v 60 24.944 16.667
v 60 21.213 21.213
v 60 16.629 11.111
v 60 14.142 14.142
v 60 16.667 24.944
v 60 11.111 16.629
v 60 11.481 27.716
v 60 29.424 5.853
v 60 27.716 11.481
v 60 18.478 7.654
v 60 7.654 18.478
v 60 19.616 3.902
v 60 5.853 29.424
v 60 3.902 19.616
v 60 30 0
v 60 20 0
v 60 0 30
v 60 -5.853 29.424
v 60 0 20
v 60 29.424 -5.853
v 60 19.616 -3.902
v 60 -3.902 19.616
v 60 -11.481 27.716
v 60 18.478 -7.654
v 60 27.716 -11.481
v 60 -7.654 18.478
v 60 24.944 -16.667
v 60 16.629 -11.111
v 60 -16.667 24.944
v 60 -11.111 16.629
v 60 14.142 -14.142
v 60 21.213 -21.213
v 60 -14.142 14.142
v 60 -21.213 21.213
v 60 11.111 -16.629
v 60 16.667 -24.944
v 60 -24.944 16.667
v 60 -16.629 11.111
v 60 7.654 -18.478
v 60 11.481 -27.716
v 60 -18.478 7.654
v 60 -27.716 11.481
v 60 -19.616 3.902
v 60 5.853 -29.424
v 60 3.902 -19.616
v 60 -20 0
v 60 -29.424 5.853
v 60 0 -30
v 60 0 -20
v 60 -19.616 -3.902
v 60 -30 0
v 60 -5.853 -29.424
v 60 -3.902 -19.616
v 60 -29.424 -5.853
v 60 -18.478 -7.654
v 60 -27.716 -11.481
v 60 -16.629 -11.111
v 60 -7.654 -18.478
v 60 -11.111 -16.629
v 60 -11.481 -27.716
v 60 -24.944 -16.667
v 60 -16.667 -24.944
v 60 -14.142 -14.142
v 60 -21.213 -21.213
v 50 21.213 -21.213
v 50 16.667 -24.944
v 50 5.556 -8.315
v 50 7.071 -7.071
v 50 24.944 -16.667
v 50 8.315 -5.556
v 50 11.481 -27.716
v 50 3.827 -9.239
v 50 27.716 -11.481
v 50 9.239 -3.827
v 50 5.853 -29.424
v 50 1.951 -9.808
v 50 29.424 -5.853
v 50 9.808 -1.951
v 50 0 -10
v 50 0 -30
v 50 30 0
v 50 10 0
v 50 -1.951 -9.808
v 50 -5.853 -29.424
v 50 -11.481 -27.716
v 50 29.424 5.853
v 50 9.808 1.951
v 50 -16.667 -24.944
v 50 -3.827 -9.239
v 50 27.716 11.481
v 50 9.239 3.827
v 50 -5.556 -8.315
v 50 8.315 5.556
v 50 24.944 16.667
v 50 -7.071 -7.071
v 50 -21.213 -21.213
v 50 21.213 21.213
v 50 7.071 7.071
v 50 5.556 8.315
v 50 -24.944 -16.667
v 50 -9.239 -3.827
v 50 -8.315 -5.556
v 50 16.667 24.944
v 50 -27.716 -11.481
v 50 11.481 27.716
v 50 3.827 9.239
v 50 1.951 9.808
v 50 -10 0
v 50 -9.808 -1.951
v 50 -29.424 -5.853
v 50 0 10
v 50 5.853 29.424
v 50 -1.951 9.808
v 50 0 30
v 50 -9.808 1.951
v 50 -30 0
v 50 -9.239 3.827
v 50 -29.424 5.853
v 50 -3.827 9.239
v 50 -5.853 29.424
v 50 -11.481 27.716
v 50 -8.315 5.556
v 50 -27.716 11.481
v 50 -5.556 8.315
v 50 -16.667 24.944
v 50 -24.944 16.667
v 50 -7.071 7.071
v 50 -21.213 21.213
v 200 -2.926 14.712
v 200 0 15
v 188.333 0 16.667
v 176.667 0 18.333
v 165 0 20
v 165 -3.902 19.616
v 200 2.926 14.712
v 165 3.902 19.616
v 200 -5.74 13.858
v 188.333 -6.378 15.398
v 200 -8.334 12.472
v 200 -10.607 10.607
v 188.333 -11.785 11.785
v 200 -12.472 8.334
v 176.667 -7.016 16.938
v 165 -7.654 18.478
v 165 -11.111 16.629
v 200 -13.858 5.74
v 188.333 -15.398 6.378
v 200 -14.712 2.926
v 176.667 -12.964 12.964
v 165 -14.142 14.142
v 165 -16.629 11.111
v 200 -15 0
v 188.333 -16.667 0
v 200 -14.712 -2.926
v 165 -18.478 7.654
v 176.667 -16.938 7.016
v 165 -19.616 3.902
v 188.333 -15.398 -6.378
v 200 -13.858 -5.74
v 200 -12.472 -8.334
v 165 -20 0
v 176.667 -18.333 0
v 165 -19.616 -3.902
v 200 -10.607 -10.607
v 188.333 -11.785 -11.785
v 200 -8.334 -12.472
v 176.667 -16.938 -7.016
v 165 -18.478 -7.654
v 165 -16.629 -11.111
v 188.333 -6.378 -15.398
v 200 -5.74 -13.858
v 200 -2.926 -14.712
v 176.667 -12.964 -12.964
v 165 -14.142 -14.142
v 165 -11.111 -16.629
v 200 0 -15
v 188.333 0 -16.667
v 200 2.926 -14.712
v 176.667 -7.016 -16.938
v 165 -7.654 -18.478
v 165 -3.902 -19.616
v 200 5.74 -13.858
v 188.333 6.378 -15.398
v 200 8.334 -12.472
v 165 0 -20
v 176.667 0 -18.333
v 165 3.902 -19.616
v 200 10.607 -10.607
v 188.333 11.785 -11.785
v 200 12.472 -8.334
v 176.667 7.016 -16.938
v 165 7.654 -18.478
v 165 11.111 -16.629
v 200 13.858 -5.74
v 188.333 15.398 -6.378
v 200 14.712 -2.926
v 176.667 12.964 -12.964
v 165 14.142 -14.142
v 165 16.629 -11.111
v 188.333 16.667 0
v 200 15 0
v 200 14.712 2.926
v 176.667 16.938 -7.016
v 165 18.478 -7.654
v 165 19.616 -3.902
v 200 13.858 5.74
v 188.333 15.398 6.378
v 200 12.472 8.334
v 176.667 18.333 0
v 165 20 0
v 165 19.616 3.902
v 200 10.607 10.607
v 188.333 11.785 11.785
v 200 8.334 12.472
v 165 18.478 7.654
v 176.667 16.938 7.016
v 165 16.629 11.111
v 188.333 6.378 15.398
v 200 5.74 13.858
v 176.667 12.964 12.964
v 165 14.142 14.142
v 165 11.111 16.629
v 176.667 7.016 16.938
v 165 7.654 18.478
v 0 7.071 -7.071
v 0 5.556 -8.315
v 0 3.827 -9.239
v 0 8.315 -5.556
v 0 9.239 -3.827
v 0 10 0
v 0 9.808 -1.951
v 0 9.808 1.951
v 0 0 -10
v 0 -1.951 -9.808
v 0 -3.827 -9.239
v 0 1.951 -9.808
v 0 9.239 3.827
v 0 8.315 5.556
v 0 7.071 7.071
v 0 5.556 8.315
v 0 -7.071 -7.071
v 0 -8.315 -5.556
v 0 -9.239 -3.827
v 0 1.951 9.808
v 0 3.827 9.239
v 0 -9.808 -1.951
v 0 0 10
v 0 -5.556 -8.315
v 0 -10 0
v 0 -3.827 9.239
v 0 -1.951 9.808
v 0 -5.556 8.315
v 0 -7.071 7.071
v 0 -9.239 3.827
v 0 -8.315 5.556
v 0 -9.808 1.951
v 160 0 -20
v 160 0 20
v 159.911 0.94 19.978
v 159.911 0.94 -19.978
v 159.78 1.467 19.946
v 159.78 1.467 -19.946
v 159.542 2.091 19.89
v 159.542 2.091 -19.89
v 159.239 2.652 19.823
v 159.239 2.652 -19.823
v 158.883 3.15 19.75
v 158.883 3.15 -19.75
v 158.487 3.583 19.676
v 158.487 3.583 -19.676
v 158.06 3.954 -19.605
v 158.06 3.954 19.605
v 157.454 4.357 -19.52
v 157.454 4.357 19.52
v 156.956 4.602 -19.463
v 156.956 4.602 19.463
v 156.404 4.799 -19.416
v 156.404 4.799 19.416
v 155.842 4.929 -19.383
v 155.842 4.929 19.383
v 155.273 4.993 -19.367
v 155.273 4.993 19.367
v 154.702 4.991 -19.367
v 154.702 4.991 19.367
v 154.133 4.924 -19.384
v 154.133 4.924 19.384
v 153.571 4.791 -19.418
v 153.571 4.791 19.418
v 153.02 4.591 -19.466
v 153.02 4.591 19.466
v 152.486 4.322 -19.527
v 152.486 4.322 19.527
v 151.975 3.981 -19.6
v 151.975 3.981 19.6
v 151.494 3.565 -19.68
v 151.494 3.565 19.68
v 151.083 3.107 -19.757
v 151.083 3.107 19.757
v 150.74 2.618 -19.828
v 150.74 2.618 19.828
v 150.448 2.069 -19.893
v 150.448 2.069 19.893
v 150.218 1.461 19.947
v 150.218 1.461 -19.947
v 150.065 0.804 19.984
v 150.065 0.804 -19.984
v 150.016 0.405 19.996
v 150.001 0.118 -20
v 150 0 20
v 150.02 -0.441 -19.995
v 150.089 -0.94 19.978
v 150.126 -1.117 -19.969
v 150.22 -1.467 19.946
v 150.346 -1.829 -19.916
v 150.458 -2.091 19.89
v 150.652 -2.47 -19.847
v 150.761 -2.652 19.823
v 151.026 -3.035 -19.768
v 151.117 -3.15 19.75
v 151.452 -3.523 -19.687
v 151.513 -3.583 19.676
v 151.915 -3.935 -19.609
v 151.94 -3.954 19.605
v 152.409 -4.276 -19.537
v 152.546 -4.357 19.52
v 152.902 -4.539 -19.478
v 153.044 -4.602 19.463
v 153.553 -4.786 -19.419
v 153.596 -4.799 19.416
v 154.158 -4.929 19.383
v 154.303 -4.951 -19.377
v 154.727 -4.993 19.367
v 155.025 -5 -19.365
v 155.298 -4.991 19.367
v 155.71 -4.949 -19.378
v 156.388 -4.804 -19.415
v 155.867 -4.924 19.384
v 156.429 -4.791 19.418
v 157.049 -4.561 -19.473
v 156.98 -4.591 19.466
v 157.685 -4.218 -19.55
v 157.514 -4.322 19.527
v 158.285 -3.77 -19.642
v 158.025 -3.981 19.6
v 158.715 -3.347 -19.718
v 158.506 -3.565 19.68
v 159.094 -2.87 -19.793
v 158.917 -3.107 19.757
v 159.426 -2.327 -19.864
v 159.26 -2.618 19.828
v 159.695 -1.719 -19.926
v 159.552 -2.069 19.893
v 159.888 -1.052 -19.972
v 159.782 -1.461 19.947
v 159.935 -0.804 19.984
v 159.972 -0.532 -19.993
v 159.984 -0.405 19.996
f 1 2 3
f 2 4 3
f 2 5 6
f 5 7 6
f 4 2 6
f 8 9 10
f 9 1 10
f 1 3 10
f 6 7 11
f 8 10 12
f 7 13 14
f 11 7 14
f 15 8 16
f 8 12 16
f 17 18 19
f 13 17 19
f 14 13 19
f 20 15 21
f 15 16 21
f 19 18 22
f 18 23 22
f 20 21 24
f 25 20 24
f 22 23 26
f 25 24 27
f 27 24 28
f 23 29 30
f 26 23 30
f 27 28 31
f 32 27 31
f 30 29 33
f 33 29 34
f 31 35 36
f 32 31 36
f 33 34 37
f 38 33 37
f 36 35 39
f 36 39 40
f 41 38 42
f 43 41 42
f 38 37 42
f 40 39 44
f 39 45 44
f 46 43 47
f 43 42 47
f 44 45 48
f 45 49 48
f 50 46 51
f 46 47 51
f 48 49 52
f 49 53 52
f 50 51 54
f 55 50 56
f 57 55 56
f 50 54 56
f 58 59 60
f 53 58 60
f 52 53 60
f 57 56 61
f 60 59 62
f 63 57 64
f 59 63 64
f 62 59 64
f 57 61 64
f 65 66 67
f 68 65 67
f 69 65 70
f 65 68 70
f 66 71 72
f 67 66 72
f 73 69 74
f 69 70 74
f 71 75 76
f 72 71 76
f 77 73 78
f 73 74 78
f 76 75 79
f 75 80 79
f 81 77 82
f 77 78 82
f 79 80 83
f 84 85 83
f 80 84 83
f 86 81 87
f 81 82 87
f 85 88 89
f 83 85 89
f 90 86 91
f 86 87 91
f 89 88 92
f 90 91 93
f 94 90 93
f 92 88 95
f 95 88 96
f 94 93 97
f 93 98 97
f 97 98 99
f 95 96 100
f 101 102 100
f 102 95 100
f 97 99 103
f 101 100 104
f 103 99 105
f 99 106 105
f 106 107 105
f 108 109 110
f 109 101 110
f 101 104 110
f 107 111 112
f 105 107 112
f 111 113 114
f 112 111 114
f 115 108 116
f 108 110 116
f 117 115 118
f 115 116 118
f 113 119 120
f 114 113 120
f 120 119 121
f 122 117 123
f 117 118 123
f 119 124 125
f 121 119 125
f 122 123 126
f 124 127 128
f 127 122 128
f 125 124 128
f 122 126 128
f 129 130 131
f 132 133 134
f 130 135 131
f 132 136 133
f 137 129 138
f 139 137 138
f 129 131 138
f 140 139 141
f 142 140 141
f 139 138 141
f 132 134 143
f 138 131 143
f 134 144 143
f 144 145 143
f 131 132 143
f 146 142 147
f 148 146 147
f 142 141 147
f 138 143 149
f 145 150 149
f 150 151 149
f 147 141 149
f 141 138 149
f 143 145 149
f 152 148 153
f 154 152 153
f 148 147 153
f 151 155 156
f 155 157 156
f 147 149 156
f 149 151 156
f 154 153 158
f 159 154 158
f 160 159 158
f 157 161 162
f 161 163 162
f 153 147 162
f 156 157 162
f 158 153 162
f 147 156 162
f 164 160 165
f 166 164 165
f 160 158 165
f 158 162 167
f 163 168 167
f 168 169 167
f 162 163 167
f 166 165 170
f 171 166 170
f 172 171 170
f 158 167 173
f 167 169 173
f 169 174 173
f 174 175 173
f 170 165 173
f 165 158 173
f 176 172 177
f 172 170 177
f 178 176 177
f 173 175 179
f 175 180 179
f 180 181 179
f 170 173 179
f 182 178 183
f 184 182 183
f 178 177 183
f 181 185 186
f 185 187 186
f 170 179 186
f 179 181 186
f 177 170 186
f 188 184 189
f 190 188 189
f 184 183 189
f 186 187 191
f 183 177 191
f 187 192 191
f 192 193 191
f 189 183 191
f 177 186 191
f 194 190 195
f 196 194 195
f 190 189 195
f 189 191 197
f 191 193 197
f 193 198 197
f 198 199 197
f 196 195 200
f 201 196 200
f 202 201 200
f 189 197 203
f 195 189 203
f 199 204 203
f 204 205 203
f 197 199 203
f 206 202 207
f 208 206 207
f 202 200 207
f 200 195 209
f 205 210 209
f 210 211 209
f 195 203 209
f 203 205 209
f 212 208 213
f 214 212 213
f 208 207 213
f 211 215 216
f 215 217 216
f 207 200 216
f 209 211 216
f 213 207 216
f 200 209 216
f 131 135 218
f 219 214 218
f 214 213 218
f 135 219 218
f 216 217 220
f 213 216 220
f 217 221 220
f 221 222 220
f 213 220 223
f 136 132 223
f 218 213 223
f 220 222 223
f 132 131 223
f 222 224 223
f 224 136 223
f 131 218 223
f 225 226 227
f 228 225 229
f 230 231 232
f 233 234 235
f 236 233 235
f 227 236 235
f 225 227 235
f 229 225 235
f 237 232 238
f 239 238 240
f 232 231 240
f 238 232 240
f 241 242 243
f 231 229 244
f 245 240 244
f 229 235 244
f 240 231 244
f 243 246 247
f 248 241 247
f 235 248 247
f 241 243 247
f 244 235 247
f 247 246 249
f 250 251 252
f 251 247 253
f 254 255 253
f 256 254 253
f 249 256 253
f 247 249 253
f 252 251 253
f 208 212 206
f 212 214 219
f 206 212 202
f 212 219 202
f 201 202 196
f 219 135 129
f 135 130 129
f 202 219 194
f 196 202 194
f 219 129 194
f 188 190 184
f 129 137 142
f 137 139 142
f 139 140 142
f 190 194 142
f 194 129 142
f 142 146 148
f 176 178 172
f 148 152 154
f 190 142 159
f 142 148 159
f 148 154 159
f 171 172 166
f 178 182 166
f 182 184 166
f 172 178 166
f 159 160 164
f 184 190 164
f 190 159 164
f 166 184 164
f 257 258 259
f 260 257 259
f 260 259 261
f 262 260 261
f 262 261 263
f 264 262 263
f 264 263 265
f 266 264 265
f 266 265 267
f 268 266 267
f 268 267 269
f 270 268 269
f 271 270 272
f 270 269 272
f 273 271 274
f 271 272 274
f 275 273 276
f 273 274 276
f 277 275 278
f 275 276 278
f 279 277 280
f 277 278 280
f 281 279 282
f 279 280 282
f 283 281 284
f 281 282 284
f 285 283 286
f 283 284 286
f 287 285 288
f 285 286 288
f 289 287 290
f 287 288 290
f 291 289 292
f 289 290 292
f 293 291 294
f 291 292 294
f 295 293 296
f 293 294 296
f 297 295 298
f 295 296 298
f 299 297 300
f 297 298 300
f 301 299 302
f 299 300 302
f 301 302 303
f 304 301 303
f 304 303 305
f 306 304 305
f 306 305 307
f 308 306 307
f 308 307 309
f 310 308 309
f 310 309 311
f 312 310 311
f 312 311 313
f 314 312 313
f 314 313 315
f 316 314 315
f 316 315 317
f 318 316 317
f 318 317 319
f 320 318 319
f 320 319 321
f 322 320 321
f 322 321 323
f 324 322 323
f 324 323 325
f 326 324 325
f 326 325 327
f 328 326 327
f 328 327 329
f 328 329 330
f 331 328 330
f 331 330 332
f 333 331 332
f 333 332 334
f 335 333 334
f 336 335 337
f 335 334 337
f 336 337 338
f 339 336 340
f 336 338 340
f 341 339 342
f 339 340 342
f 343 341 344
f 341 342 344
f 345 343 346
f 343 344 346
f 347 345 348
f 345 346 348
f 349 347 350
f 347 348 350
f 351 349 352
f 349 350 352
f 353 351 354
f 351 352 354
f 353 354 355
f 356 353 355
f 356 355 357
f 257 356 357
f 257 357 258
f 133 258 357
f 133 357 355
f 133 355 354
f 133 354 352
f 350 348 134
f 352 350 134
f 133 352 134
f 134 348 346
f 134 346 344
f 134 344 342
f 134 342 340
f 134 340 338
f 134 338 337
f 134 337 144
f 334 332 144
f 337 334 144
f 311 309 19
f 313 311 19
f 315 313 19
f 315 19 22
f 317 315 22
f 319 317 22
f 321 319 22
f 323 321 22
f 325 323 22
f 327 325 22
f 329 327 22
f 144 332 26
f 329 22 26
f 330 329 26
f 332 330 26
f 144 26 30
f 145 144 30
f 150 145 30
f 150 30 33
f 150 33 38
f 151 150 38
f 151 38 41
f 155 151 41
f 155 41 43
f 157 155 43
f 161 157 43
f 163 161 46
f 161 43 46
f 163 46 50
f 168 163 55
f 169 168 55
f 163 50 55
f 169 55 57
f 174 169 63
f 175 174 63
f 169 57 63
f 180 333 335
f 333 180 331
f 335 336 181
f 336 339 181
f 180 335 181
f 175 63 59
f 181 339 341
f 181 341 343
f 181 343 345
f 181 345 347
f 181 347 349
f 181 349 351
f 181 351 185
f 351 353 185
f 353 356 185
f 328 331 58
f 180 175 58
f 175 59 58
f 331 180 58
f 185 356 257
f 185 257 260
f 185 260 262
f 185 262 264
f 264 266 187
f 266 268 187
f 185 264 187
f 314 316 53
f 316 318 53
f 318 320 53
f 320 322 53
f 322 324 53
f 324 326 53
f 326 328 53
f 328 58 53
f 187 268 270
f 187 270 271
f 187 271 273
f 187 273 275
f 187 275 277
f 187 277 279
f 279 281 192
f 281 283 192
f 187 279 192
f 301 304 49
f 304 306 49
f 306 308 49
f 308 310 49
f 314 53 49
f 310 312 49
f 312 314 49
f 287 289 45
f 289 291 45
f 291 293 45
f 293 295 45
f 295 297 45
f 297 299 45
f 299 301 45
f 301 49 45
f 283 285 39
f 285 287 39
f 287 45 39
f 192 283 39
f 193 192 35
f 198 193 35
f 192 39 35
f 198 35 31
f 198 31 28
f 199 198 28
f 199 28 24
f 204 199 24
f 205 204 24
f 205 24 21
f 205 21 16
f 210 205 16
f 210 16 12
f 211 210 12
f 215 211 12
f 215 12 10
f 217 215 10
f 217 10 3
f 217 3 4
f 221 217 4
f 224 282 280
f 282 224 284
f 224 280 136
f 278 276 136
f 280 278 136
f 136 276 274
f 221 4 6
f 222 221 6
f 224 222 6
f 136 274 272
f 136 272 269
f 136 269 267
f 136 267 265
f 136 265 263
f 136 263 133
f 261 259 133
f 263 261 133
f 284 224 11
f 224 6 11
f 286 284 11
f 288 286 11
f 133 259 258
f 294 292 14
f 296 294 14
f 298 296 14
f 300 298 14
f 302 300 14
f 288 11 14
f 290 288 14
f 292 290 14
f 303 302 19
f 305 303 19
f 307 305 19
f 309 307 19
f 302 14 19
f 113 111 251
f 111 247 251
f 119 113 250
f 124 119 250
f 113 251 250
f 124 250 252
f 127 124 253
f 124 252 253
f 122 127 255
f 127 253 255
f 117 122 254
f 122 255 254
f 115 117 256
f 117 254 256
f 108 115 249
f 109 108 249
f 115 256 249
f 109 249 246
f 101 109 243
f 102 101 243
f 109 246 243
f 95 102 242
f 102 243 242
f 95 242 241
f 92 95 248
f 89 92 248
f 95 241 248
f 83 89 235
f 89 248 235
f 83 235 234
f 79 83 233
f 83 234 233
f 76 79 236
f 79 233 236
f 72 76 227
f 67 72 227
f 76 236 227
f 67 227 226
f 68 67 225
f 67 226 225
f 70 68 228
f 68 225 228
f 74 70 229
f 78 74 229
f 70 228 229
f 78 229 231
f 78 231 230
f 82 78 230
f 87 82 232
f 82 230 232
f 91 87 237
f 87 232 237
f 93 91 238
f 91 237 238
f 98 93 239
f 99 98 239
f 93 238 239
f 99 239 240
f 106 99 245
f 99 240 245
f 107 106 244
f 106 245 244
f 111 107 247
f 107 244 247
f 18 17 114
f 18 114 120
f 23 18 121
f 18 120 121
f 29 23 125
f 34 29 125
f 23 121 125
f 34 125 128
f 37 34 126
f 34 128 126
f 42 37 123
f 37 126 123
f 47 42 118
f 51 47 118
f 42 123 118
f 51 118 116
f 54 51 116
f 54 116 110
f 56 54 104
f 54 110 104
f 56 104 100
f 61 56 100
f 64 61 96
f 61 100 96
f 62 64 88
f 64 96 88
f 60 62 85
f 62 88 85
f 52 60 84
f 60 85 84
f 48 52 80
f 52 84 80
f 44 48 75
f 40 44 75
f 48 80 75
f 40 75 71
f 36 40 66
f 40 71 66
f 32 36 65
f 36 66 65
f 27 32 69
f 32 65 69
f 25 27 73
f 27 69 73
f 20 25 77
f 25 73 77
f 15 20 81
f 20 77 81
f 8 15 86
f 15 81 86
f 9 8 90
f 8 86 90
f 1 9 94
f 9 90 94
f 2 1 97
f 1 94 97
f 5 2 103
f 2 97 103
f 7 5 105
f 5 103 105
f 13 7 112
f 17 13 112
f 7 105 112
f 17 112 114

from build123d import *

# Parameters (mm, degrees)
SKETCH_2_R          = 5
CUT_EXTRUDE_1_DEPTH = 209.32666656


with BuildPart() as part:
    # 草图1 → 旋转1 (revolve)
    with BuildSketch(Plane.XY, mode=Mode.PRIVATE) as revolve_1_sk:
        Polygon((0, 0), (200, 0), (200, 15), (165, 20), (60, 20), (60, 30), (50, 30), (50, 10), (0, 10), align=None)
    revolve(revolve_1_sk.sketch.rotate(Axis((0, 0, 0), (1, 0, 0)), 90), axis=Axis((0, 0, 0), (1, 0, 0)))

    # 草图2 → 切除-拉伸1 (cut, through all)
    with BuildSketch(Plane.XY.offset(20)):
        with Locations((155, 0)):
            Circle(SKETCH_2_R)
    extrude(amount=-CUT_EXTRUDE_1_DEPTH, mode=Mode.SUBTRACT)


solid = part.part
